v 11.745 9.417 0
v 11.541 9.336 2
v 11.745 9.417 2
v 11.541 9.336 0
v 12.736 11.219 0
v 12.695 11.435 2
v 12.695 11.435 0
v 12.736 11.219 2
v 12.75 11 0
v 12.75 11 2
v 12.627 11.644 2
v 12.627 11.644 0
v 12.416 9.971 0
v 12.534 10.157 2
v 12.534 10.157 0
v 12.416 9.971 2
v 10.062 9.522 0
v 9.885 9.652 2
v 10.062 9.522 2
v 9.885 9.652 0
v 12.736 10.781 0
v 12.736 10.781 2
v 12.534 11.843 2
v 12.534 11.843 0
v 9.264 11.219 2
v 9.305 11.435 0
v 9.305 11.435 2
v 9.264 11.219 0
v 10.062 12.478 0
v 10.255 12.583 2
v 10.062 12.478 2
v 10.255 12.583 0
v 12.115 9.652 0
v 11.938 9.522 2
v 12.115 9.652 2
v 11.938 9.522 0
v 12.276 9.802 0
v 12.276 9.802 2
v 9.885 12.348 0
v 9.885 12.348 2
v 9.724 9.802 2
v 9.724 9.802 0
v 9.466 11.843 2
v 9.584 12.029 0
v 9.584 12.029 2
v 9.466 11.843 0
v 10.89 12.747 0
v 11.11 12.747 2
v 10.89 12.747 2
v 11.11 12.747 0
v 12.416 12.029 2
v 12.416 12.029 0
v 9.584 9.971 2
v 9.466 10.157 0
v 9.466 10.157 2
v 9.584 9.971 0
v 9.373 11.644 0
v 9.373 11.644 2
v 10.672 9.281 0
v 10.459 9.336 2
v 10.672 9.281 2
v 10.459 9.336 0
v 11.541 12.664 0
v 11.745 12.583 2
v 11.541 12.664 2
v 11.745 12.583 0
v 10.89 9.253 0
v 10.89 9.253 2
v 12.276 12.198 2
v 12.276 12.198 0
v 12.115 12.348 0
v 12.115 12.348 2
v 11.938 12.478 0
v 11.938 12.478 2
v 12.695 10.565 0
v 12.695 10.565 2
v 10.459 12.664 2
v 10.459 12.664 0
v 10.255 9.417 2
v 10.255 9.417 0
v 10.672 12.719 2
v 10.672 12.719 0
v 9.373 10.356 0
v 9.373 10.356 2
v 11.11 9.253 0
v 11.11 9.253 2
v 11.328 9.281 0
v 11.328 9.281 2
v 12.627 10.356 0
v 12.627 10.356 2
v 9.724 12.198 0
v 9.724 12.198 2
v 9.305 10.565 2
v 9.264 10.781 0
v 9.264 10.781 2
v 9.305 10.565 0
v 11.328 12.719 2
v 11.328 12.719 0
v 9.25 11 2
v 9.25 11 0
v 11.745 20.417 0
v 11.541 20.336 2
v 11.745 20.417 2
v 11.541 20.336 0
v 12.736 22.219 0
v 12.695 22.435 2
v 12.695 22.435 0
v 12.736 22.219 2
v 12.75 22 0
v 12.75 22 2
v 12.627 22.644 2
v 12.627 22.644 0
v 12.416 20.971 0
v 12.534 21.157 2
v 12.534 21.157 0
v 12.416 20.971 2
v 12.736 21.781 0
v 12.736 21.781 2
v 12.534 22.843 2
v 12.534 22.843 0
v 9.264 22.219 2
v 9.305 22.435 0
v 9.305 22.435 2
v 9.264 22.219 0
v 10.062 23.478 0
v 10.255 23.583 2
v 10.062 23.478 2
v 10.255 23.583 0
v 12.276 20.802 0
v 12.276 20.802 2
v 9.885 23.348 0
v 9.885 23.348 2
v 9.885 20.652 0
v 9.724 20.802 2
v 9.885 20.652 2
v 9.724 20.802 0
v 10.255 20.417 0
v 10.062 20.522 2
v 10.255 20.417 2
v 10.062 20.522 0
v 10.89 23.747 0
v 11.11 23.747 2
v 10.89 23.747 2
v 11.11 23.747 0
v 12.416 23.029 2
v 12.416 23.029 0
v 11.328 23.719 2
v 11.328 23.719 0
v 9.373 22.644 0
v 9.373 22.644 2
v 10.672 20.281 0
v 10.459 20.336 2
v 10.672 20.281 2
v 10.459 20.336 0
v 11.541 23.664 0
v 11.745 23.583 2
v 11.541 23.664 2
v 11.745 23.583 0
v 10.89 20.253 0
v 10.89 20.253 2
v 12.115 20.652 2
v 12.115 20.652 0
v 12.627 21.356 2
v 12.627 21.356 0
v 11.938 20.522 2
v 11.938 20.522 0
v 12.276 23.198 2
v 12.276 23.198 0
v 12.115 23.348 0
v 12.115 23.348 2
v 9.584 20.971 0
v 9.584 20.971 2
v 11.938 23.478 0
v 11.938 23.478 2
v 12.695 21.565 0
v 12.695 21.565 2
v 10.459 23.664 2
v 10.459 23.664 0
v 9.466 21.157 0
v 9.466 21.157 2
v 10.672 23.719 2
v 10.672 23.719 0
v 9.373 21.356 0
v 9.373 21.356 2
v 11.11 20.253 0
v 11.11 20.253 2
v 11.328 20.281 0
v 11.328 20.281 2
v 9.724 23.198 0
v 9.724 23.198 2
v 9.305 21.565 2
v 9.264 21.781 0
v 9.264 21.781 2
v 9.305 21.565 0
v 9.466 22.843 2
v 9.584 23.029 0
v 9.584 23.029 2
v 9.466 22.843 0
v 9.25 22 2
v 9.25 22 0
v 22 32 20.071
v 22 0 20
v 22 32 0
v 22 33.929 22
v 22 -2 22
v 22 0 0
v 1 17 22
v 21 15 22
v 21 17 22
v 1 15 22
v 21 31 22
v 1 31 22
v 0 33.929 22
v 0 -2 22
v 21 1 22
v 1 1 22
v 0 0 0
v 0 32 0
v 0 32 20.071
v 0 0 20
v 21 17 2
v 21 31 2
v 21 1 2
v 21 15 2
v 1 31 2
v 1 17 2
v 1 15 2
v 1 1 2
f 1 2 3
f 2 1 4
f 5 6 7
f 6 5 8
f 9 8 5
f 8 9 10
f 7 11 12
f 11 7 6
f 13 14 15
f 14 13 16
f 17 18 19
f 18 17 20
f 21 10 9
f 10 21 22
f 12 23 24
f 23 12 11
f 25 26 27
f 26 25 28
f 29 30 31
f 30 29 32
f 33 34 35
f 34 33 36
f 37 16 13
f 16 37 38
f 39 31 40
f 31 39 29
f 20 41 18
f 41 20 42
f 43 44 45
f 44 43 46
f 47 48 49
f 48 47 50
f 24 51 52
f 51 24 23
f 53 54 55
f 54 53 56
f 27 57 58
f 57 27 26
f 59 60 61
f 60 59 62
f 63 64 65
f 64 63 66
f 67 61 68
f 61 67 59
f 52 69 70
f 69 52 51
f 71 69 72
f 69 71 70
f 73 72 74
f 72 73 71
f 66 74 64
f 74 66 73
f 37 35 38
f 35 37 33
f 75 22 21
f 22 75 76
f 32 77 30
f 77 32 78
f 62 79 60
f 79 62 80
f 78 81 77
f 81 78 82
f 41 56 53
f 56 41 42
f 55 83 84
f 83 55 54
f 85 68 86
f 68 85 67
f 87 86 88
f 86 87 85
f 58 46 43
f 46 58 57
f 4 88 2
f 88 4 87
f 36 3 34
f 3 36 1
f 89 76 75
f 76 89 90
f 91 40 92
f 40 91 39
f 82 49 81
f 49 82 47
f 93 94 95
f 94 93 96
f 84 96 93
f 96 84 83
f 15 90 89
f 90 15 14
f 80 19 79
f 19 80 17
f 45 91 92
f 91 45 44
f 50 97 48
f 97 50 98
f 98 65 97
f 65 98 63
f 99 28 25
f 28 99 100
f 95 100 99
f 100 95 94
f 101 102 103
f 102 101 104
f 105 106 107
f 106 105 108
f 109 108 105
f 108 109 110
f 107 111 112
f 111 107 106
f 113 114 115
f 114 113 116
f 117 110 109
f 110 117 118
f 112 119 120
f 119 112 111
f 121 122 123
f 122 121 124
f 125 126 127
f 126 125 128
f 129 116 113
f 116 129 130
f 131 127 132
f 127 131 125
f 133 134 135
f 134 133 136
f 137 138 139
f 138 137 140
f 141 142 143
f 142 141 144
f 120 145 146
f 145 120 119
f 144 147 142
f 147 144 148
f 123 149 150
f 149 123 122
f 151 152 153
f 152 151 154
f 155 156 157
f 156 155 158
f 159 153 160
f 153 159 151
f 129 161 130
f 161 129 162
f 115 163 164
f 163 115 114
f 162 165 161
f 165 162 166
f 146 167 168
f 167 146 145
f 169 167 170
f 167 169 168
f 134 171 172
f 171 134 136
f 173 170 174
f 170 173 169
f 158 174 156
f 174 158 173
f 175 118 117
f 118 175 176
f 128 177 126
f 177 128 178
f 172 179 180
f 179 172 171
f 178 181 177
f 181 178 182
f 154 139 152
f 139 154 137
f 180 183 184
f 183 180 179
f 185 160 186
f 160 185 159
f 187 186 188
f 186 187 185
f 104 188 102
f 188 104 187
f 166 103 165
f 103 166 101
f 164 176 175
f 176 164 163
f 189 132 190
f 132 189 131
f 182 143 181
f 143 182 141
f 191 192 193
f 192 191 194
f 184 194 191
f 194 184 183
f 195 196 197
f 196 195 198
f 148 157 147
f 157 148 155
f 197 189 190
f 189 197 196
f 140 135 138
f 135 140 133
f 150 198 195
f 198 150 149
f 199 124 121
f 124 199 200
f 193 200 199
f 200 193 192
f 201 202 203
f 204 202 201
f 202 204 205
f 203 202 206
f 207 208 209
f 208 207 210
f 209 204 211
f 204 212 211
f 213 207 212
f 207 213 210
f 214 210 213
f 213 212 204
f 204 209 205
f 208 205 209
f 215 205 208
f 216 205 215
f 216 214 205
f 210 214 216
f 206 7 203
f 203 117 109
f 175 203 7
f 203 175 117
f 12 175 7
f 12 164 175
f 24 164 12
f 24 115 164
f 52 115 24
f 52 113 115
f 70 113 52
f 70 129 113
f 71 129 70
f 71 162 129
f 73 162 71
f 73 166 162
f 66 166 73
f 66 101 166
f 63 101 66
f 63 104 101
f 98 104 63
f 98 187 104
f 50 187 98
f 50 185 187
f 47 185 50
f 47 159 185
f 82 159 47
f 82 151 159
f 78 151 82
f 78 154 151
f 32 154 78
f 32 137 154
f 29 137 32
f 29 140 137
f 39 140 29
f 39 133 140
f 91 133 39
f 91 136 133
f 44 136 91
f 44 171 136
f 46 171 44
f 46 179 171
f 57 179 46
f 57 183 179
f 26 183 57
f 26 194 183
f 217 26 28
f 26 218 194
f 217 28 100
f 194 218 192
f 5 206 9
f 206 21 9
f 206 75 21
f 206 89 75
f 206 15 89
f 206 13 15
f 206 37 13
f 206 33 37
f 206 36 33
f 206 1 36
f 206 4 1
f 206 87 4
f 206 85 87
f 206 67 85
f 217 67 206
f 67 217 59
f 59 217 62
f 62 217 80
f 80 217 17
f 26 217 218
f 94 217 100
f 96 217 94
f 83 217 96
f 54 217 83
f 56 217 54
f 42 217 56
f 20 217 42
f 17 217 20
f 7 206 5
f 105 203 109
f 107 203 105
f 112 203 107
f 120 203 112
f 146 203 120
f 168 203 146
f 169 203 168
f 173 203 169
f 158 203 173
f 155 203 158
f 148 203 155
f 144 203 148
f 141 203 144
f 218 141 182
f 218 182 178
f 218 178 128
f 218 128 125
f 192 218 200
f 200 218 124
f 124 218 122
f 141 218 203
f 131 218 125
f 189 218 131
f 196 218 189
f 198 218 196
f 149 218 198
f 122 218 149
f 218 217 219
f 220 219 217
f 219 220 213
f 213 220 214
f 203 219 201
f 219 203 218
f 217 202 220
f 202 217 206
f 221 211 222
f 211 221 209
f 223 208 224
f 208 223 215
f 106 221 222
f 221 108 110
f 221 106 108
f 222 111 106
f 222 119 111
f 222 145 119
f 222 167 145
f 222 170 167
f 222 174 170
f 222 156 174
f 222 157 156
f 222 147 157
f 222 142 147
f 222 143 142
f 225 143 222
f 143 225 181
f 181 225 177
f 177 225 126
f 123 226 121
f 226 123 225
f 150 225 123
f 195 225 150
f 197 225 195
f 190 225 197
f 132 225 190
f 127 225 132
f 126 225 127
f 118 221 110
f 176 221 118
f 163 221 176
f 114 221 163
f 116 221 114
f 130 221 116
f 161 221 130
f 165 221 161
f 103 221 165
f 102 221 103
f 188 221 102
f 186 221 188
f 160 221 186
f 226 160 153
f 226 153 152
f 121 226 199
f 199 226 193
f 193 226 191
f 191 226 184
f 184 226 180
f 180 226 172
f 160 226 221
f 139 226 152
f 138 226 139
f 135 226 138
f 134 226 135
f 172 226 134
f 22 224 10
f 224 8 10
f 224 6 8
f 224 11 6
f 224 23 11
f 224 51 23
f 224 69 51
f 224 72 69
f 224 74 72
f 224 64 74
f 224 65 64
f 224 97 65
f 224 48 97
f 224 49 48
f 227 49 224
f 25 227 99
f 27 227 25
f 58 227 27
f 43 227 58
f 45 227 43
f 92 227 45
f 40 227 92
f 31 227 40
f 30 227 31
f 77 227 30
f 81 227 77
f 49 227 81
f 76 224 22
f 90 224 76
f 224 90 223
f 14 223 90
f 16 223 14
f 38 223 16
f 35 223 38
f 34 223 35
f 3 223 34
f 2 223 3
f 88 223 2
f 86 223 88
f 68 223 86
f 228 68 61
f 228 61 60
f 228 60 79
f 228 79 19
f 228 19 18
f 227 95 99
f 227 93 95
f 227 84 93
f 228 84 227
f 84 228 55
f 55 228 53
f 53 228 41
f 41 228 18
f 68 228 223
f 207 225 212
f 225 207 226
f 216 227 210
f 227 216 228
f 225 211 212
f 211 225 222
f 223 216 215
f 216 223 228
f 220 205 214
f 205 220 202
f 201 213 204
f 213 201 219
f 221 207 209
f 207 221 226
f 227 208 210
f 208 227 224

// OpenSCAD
// (C) 2016 B. Visee, info@lichtsignaal.nl
// This is for making lightboxes in, mostly, h0-scale, houses
// No guarentees, but I like it!
// You can make it all sorts of sizes with an adjustable
// number of holes for your LED's (also adjustable!)

// 0.25mm height
// 

// Set parameters as you wish
width = 30;
depth = 20;
height = 20;
diameter = 3.5; // On my da Vinci this is the size for 3mm LED
numholes = 2;

// Leave alone from here, unless you know what you are doing
holedistance = (width / (numholes+1)) + 1;

translate([1,15,2])
{
    cube([20,2,20]);
}

union()
{
    difference()
    {
        cube([height+2,width+2,depth+2]);

        translate([1, 1, 2])
        {
        cube([height,width,depth+2]);
        }

        for (n = [ 1 : numholes ] )
        {
            translate([(height/2)+1,n*holedistance,-3])
            {
                cylinder(10,d=diameter,diameter/2,$fn=50);
            }
        }
    }

    difference()
    {
        translate([0,-2,depth])
        {    
            cube([height+2,2,2]);
        }

        translate([-1,1,depth-1])
        {
            rotate([135,0,0])
            {
                cube([height+4,5,5]);
            }
        }
    }

    difference()
    {
        translate([0,width+2,depth])
        {    
            cube([height+2,2,2]);
        }

        translate([-1,width+8,depth-1])
        {
            rotate([135,0,0])
            {
                cube([height+4,5,5]);
            }
        }
    }
}
